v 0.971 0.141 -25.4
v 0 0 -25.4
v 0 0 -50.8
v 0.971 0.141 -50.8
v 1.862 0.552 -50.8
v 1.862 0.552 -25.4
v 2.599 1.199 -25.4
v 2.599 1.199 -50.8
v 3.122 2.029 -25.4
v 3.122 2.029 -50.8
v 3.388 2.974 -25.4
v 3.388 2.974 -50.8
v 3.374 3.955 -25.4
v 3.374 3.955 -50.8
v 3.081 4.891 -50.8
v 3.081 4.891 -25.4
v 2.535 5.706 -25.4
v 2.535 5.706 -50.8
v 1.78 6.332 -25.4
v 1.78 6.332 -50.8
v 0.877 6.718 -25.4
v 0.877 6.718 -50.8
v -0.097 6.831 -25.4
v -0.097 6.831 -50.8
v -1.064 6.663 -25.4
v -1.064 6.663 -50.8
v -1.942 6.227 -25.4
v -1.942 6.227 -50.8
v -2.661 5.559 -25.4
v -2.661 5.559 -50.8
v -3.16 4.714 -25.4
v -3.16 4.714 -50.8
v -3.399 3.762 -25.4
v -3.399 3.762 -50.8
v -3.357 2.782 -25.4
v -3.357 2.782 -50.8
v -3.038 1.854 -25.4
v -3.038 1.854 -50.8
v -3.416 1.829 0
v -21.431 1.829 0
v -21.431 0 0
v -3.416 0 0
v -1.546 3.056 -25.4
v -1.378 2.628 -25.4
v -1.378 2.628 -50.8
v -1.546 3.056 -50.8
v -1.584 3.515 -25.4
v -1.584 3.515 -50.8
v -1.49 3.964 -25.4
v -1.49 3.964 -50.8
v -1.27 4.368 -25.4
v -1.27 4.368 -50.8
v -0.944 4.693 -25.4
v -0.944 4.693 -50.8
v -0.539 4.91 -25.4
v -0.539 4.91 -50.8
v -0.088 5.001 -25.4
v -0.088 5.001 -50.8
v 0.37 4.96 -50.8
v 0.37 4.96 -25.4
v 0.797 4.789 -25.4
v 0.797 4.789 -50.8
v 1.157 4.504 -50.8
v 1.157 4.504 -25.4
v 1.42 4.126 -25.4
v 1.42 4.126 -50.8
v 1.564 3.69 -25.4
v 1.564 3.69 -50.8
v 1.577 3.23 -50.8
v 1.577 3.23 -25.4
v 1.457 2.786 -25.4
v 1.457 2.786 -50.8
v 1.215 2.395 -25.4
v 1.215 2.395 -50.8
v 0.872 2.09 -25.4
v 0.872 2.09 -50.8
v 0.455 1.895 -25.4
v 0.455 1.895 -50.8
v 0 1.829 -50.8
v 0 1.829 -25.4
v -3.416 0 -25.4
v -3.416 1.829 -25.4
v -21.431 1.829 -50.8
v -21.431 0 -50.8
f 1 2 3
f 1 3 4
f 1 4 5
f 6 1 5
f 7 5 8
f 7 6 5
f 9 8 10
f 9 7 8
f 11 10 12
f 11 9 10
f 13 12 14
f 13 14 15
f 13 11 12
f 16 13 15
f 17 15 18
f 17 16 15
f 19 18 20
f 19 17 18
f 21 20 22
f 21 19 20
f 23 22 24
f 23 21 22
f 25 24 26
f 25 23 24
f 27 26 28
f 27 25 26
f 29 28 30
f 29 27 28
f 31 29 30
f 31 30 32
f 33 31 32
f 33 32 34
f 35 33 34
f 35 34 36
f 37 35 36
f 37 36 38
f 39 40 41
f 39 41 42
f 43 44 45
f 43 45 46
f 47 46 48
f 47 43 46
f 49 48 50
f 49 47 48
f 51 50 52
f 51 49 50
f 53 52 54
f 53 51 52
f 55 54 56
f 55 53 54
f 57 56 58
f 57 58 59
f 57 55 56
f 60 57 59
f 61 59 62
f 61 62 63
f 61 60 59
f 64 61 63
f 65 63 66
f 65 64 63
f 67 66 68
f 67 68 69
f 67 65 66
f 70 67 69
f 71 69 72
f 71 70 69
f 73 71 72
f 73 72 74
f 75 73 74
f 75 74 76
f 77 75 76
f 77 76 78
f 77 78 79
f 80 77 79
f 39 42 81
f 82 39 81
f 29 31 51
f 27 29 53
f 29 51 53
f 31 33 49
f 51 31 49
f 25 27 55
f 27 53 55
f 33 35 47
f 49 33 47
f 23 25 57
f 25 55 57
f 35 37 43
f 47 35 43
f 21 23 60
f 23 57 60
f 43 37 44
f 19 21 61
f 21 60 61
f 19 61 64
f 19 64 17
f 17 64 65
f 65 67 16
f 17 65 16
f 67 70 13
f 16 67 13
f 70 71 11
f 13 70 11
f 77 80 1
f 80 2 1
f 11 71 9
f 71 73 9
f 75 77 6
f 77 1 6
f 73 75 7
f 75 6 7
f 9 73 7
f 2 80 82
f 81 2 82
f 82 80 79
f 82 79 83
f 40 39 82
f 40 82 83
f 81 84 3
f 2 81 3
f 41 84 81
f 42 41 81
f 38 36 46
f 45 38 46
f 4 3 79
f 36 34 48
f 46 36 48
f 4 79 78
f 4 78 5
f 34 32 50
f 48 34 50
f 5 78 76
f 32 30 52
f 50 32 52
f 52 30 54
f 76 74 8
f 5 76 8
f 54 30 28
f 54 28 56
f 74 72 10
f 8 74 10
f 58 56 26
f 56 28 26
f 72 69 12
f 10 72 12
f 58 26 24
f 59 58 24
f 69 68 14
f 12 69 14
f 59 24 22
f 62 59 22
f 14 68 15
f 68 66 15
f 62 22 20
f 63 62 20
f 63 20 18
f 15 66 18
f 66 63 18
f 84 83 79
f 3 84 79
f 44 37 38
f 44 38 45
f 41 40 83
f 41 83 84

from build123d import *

# Parameters (mm, degrees)
EXTRUDE1_DEPTH     = 50.8
SKETCH2_W          = 6.8326
SKETCH2_H          = 25.4
CUT_EXTRUDE4_DEPTH = 56.557383842


with BuildPart() as part:
    # Sketch1 → Extrude1 (new body)
    with BuildSketch(Plane.XY):
        with BuildLine():
            Line((-21.43125, 0), (0, 0))
            ThreePointArc((0, 0), (1.779677423, 6.332436821), (-3.038247732, 1.8542))
            Line((-3.038247732, 1.8542), (-1.378132955, 2.628324234))
            ThreePointArc((-1.378132955, 2.628324234), (0.796631885, 4.789447439), (0, 1.8288))
            Line((0, 1.8288), (-21.43125, 1.8288))
            Line((-21.43125, 1.8288), (-21.43125, 0))
        make_face()
    extrude(amount=-EXTRUDE1_DEPTH)

    # Sketch2 → Cut-Extrude4 (cut, through all)
    with BuildSketch(Plane(origin=(0, 0, 0), x_dir=(1, 0, 0), z_dir=(0, 1, 0))):
        with Locations((0, 12.7)):
            Rectangle(SKETCH2_W, SKETCH2_H)
    extrude(amount=CUT_EXTRUDE4_DEPTH, mode=Mode.SUBTRACT)


solid = part.part
